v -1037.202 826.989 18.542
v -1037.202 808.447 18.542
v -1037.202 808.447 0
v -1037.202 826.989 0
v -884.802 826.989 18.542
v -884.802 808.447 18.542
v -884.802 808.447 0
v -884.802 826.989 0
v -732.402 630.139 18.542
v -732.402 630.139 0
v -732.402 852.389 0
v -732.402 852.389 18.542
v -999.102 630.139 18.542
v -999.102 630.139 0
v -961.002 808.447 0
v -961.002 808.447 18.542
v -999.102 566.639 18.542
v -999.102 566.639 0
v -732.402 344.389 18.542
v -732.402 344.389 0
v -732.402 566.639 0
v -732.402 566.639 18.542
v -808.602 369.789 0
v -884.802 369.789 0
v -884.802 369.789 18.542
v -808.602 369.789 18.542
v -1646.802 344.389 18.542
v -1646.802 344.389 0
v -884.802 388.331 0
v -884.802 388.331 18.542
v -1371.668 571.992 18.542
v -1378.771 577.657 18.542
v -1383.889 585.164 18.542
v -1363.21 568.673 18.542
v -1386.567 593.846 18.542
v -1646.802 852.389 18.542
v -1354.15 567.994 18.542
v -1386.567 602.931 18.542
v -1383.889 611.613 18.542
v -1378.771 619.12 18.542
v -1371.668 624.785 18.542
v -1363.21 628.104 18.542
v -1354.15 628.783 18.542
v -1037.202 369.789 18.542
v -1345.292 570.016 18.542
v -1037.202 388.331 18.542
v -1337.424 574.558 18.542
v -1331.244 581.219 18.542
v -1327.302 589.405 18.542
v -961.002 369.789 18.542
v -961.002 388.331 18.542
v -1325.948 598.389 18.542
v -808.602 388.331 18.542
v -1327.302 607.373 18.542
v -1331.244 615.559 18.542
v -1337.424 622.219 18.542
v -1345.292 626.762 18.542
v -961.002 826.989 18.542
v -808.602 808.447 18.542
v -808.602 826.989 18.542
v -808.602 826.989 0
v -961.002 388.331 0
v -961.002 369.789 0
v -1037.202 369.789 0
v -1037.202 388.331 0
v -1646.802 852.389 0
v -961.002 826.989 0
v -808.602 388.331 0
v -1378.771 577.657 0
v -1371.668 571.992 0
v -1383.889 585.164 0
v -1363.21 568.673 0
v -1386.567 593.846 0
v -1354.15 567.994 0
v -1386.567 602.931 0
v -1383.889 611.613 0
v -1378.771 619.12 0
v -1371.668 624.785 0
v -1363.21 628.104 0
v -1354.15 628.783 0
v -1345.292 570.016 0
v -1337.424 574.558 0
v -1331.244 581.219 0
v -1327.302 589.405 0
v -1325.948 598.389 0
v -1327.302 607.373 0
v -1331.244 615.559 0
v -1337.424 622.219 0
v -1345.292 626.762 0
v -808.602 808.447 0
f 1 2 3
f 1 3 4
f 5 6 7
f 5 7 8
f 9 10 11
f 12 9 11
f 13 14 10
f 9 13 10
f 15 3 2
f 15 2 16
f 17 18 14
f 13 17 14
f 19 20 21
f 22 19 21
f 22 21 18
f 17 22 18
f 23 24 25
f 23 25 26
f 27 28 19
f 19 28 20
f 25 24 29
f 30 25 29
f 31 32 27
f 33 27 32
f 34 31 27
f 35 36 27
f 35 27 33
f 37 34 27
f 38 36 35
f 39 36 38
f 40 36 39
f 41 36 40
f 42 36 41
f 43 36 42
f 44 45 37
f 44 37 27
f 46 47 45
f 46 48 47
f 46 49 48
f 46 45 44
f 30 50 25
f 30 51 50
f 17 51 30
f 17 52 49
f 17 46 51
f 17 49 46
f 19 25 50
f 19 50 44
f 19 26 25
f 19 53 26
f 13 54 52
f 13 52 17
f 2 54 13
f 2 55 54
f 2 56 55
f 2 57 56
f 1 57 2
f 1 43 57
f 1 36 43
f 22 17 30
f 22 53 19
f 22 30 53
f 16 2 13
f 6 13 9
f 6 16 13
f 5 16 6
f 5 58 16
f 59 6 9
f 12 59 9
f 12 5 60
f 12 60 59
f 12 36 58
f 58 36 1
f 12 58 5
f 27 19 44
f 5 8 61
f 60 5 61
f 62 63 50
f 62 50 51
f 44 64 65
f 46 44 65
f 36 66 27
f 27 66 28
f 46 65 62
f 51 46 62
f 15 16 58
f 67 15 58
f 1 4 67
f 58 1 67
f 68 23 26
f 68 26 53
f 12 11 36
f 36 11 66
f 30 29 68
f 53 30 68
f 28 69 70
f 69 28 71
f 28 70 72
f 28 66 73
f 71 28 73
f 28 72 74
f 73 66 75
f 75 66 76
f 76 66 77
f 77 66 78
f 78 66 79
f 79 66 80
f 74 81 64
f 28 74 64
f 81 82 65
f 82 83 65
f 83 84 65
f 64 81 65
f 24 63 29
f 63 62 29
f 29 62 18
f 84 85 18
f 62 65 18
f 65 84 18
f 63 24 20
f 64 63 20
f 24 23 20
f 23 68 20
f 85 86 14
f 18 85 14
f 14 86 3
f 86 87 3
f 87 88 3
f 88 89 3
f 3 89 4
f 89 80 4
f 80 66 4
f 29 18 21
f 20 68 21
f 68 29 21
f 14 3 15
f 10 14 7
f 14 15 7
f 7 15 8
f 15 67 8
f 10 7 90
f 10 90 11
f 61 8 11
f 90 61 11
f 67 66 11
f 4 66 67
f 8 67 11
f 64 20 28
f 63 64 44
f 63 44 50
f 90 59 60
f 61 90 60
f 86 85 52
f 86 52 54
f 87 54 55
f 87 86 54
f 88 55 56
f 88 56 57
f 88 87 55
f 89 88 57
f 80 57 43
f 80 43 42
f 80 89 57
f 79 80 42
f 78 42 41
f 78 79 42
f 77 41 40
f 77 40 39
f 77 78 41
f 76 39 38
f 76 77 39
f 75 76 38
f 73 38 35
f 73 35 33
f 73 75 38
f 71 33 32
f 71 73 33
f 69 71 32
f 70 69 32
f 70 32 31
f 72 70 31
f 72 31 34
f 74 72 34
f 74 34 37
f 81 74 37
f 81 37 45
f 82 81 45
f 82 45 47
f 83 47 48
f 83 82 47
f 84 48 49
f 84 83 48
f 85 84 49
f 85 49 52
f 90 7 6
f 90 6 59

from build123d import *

# Parameters (mm, degrees)
F0_W     = 76.2
F0_H     = 18.542
F0_R     = 30.48
F1_DEPTH = 18.542
F2_DEPTH = 18.542


with BuildPart() as f1:
    # F0 (on Top) → F1 (new body)
    with BuildSketch(Plane.XY):
        Polygon((-732.4015087128, 852.3886724055), (-1646.8015087128, 852.3886724055), (-1646.8015087128, 547.5886724055), (-1646.8015087128, 344.3886724055), (-732.4015087128, 344.3886724055), (-732.4015087128, 369.7886724055), (-732.4015087128, 566.6386724055), (-999.1015087128, 566.6386724055), (-999.1015087128, 630.1386724055), (-732.4015087128, 630.1386724055), (-732.4015087128, 808.4466724055), (-732.4015087128, 826.9886724055), align=None)
        with Locations((-999.1015087128, 379.0596724055)):
            Rectangle(F0_W, F0_H, mode=Mode.SUBTRACT)
        with Locations((-846.7015087128, 379.0596724055)):
            Rectangle(F0_W, F0_H, mode=Mode.SUBTRACT)
        with Locations((-1356.4279079437, 598.3886724055)):
            Circle(F0_R, mode=Mode.SUBTRACT)
        with Locations((-999.1015087128, 817.7176724055)):
            Rectangle(F0_W, F0_H, mode=Mode.SUBTRACT)
        with Locations((-846.7015087128, 817.7176724055)):
            Rectangle(F0_W, F0_H, mode=Mode.SUBTRACT)
    extrude(amount=F1_DEPTH)

    # F0 (on Top) → F2 (join)
    with BuildSketch(Plane.XY):
        Polygon((-732.4015087128, 852.3886724055), (-1646.8015087128, 852.3886724055), (-1646.8015087128, 547.5886724055), (-1646.8015087128, 344.3886724055), (-732.4015087128, 344.3886724055), (-732.4015087128, 369.7886724055), (-732.4015087128, 566.6386724055), (-999.1015087128, 566.6386724055), (-999.1015087128, 630.1386724055), (-732.4015087128, 630.1386724055), (-732.4015087128, 808.4466724055), (-732.4015087128, 826.9886724055), align=None)
        with Locations((-999.1015087128, 379.0596724055)):
            Rectangle(F0_W, F0_H, mode=Mode.SUBTRACT)
        with Locations((-846.7015087128, 379.0596724055)):
            Rectangle(F0_W, F0_H, mode=Mode.SUBTRACT)
        with Locations((-1356.4279079437, 598.3886724055)):
            Circle(F0_R, mode=Mode.SUBTRACT)
        with Locations((-999.1015087128, 817.7176724055)):
            Rectangle(F0_W, F0_H, mode=Mode.SUBTRACT)
        with Locations((-846.7015087128, 817.7176724055)):
            Rectangle(F0_W, F0_H, mode=Mode.SUBTRACT)
    extrude(amount=F2_DEPTH)


solid = f1.part
